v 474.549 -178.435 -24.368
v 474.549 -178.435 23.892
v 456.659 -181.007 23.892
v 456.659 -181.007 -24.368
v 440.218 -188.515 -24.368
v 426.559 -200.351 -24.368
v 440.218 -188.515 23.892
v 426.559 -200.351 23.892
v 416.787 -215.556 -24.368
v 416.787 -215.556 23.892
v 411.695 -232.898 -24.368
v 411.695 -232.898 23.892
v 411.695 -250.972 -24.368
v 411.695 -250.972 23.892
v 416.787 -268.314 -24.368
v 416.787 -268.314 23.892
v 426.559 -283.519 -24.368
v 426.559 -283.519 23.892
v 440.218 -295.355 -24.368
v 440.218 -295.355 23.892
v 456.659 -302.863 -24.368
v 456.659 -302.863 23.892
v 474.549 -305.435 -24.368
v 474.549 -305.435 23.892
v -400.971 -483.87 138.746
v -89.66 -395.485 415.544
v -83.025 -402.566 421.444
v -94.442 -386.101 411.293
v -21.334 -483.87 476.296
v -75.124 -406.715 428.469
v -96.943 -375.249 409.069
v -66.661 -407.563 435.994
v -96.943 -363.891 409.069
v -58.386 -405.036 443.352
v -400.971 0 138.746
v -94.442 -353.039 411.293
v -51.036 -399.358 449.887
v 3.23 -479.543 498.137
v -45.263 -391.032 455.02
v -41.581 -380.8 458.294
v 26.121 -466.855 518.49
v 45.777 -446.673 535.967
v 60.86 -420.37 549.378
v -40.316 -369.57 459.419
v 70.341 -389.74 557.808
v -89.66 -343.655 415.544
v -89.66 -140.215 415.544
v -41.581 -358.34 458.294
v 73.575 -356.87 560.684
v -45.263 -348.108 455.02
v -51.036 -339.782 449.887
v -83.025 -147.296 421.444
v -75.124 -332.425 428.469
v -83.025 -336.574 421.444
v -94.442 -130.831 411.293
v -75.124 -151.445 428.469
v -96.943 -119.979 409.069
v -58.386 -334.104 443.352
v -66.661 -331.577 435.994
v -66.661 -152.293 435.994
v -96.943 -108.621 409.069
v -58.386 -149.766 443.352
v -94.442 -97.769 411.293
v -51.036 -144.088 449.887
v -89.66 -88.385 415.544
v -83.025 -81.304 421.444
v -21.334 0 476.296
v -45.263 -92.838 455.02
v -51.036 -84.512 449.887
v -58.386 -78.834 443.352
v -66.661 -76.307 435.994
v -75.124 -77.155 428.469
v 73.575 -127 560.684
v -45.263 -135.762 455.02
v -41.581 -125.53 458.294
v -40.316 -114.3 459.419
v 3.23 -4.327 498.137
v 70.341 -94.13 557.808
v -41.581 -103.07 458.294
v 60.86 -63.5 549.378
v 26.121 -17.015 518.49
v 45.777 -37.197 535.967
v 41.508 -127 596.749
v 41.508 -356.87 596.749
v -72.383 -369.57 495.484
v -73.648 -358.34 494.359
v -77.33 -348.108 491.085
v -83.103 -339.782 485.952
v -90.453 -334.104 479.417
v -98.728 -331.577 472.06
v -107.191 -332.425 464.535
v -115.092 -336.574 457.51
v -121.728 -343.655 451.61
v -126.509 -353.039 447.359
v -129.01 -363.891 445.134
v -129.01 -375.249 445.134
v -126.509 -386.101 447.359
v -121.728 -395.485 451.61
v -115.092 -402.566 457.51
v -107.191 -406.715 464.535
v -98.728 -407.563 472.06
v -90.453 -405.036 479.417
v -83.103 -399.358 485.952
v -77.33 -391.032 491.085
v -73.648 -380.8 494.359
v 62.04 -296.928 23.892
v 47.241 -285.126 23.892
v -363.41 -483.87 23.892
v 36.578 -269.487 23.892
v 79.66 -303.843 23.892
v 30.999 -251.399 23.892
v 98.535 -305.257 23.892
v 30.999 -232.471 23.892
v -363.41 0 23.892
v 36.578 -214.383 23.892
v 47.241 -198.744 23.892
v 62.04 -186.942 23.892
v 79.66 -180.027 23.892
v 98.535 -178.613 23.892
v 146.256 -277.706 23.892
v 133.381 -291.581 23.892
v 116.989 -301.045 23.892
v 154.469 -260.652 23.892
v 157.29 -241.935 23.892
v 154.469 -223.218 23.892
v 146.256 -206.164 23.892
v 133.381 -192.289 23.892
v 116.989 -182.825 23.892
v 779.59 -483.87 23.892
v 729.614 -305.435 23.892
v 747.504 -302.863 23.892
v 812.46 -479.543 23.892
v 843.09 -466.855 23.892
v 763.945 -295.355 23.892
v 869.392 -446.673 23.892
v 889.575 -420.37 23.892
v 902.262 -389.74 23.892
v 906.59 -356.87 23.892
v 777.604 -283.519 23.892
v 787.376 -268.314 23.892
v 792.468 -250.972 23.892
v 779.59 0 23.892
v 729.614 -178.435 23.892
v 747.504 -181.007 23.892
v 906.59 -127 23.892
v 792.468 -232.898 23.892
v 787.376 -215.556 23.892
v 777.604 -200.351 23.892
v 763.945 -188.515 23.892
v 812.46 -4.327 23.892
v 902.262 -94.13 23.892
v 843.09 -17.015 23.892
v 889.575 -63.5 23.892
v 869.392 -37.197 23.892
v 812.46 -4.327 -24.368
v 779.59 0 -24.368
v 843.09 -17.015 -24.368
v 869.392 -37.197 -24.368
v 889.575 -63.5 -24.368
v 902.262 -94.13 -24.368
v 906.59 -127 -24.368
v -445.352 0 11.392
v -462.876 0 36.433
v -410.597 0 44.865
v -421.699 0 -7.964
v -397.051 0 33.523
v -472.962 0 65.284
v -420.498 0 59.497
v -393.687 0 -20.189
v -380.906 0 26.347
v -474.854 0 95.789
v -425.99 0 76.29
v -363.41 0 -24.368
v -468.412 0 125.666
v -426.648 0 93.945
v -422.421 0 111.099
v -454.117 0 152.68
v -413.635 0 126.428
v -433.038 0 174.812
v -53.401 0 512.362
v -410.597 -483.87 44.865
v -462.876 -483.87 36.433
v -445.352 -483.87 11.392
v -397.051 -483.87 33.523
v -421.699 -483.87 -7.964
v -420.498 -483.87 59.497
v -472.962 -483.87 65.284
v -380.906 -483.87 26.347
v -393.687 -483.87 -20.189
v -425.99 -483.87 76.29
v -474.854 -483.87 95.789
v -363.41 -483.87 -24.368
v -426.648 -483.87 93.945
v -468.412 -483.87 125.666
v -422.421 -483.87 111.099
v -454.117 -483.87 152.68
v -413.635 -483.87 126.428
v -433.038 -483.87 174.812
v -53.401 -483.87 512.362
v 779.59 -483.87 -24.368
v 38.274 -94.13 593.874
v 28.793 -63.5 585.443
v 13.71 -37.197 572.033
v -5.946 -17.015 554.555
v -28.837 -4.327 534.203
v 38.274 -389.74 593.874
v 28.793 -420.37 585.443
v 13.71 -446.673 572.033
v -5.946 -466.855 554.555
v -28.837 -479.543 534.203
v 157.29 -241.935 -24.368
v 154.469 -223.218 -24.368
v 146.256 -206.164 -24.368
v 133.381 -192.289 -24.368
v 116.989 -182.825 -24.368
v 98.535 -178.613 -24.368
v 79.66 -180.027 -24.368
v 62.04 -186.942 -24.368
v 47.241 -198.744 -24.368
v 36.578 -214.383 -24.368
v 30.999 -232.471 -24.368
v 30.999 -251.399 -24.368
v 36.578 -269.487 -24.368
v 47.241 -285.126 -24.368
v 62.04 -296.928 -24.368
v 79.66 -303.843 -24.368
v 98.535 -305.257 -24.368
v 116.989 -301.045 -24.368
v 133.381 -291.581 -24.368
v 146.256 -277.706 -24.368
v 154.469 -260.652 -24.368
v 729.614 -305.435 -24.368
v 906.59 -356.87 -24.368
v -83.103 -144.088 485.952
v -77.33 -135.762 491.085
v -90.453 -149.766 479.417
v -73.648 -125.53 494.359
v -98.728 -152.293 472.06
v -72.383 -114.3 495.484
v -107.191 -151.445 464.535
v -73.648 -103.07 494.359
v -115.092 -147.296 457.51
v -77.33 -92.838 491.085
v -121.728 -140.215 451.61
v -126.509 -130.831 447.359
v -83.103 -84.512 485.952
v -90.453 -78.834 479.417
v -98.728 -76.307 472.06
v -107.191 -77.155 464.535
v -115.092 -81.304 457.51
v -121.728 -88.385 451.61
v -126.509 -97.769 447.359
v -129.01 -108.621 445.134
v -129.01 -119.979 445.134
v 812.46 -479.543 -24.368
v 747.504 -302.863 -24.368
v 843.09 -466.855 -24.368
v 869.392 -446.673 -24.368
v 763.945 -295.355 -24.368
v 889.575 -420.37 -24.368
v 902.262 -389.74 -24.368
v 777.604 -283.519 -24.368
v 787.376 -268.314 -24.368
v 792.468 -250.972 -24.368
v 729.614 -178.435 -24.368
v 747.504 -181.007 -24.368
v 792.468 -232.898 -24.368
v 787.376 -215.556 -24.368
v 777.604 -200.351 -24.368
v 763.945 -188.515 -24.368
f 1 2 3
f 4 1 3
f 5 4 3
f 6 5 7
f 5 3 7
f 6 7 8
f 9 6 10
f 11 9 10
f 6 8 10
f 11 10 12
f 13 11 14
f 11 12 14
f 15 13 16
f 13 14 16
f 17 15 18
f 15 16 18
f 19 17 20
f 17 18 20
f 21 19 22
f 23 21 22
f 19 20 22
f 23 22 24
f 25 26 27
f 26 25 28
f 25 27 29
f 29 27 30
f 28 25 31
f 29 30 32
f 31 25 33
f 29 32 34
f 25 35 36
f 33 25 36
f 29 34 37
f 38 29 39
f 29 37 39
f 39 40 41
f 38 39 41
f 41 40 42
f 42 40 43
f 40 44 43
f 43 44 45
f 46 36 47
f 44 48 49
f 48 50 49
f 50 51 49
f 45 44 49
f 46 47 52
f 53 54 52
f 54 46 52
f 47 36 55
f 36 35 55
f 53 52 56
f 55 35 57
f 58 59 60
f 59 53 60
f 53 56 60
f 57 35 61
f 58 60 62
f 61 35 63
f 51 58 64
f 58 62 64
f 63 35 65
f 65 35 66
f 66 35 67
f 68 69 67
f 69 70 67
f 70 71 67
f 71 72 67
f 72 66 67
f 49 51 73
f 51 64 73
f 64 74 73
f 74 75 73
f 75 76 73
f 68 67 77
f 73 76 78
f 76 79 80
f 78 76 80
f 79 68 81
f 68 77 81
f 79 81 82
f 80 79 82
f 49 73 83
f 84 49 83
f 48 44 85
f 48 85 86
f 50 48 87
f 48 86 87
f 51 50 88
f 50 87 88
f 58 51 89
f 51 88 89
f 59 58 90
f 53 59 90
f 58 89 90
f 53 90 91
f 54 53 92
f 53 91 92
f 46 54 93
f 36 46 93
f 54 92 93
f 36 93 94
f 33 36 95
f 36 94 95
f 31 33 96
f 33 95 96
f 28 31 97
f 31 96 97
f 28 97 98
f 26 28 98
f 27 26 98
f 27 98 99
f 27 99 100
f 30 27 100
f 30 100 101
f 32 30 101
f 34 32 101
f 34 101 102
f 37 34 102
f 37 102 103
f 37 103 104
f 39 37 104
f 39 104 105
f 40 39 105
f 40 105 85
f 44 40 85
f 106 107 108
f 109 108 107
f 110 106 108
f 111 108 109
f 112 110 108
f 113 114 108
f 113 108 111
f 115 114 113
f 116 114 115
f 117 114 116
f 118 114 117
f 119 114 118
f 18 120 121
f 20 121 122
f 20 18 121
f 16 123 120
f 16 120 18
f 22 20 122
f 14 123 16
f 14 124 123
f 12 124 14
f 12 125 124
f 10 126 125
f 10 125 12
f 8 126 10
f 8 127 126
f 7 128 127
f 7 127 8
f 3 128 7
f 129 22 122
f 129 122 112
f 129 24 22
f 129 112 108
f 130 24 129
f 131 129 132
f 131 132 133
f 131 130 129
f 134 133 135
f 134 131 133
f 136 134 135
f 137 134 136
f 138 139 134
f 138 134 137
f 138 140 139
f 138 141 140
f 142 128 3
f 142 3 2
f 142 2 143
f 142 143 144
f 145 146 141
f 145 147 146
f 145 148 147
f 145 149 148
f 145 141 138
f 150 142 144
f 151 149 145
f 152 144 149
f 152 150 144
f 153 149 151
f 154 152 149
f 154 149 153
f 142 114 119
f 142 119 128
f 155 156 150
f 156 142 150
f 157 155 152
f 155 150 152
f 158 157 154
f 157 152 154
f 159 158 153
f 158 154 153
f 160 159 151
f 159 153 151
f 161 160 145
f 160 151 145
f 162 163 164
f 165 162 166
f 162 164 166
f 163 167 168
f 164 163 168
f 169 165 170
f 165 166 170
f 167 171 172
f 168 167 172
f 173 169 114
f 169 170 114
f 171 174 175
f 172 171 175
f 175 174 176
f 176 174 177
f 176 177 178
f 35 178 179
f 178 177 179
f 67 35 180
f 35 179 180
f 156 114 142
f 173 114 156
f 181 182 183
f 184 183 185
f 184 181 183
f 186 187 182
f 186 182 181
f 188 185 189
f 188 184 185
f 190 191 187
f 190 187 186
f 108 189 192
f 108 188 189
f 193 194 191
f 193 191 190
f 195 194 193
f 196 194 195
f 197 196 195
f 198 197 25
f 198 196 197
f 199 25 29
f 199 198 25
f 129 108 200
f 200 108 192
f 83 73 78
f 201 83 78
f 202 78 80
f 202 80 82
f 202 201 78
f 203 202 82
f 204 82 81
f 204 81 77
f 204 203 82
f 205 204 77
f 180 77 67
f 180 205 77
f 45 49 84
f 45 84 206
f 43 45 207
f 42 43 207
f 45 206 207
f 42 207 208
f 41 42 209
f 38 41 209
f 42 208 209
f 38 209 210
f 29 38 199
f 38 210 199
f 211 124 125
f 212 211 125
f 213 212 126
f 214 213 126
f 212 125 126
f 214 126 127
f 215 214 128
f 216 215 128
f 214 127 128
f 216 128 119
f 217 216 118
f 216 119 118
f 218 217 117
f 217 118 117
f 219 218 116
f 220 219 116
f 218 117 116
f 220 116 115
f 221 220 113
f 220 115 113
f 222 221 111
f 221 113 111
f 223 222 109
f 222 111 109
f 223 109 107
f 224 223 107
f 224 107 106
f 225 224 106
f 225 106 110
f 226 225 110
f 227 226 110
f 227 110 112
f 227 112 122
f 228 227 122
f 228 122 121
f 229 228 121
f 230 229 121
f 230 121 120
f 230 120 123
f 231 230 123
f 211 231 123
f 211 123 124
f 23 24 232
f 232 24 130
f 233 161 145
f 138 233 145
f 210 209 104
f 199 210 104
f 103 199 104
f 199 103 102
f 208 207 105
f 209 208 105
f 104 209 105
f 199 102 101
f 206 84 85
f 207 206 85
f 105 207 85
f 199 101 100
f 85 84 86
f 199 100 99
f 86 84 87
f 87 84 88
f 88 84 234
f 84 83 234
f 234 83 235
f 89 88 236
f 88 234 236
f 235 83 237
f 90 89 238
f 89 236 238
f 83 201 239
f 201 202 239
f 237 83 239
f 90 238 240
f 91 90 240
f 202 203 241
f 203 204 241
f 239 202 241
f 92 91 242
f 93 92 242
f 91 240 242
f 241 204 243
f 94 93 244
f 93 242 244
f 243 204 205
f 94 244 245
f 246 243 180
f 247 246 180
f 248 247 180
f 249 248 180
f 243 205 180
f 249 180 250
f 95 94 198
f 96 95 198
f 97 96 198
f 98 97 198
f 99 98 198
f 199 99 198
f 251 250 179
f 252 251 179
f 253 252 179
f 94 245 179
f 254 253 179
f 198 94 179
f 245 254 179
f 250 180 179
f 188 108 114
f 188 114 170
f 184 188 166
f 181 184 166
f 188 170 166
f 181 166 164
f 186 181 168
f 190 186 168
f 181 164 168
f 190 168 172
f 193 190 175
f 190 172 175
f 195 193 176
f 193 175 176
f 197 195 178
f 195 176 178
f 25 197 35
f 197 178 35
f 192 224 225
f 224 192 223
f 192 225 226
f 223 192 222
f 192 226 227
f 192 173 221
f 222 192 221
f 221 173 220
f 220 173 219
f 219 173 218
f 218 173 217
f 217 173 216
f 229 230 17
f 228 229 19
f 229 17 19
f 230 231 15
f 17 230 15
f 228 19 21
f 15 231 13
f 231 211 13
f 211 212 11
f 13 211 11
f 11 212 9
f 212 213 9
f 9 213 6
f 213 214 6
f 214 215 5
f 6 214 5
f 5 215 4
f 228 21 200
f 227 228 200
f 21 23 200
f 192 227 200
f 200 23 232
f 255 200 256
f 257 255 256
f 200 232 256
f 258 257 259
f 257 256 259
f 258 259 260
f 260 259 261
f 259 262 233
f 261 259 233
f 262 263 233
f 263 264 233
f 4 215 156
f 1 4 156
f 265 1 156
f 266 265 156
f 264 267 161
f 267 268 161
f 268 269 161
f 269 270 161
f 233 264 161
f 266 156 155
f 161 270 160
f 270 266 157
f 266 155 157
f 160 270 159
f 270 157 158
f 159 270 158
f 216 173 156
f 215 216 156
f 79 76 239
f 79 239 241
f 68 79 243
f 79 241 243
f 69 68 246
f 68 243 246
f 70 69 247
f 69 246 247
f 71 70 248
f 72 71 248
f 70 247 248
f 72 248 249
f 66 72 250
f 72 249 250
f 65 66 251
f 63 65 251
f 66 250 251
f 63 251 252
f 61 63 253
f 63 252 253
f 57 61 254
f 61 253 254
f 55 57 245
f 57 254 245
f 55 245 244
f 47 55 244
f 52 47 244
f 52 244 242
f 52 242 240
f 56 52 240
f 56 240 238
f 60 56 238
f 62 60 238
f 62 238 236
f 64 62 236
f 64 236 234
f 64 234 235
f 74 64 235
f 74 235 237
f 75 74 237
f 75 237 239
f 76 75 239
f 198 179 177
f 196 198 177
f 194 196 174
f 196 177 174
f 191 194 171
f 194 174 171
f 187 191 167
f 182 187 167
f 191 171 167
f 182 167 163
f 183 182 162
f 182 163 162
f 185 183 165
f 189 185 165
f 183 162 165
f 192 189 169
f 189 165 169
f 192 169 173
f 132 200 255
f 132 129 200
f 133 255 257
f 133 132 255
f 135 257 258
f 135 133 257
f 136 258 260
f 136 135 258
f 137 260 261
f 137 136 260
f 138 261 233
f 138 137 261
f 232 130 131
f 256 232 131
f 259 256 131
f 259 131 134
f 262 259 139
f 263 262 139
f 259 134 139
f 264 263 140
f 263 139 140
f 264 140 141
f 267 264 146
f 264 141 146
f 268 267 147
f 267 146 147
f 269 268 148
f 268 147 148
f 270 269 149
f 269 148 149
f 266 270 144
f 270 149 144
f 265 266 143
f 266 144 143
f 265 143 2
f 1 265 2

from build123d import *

# Parameters (mm, degrees)
F0_W          = 1270
F0_H          = 48.26
F1_DEPTH      = 483.87
F2_R          = 127
F3_R          = 127
F4_R          = 38.1
F5_DEPTH      = 119.38
F6_R          = 63.5
F7_DEPTH      = 76.2
F7_DEPTH_BACK = 76.2


with BuildPart() as f1:
    # F0 (on Front) → F1 (new body)
    with BuildSketch(Plane.XZ):
        with Locations((271.5897267231, -0.2383861614)):
            Rectangle(F0_W, F0_H)
        with BuildLine():
            Line((-363.4102732769, -24.3683861614), (-363.4102732769, 23.8916138386))
            ThreePointArc((-363.4102732769, 23.8916138386), (-423.8304438336, 67.7016554332), (-400.9706434856, 138.7463335075))
            Line((-400.9706434856, 138.7463335075), (-433.0378788647, 174.8118296935))
            ThreePointArc((-433.0378788647, 174.8118296935), (-468.9099911057, 50.5119834442), (-363.4102732769, -24.3683861614))
        make_face()
        Polygon((-433.0378788647, 174.8118296935), (-400.9706434856, 138.7463335075), (73.5753589619, 560.6836411268), (41.5081235828, 596.7491373128), align=None)
    extrude(amount=F1_DEPTH)

    # F2
    f2_edges = [f1.edges().sort_by_distance(p)[0] for p in [
        (57.541741, 0, 578.716389),
        (57.541741, -483.87, 578.716389),
    ]]
    fillet(f2_edges, radius=F2_R)

    # F3
    f3_edges = [f1.edges().sort_by_distance(p)[0] for p in [
        (906.589727, -483.87, -0.238386),
        (906.589727, 0, -0.238386),
    ]]
    fillet(f3_edges, radius=F3_R)

    # F4 (on face) → F5 (cut)
    with BuildSketch(Plane(origin=(-277.999987923, 0, 312.6620485248), x_dir=(0.7473165393, 0, 0.664468201), z_dir=(-0.664468201, 0, 0.7473165393))):
        with Locations((237.0405329721, -114.3)):
            Circle(F4_R)
        with Locations((237.0405329721, -369.57)):
            Circle(F4_R)
    extrude(amount=-F5_DEPTH, mode=Mode.SUBTRACT)

    # F6 (on face) → F7 (cut, two sides)
    with BuildSketch(Plane.XY.offset(23.8916138386)) as f7_sk:
        with Locations((93.7897267231, -241.935)):
            Circle(F6_R)
        with BuildLine():
            ThreePointArc((538.0487868786, -241.935), (519.4500674839, -197.0337193947), (474.5487868786, -178.435))
            ThreePointArc((474.5487868786, -178.435), (411.0487868786, -241.935), (474.5487868786, -305.435))
            ThreePointArc((474.5487868786, -305.435), (519.4500674839, -286.8362806053), (538.0487868786, -241.935))
        make_face()
        with BuildLine():
            ThreePointArc((729.6141386032, -305.435), (666.1141386032, -241.935), (729.6141386032, -178.435))
            Line((729.6141386032, -178.435), (474.5487868786, -178.435))
            ThreePointArc((474.5487868786, -178.435), (519.4500674839, -197.0337193947), (538.0487868786, -241.935))
            ThreePointArc((538.0487868786, -241.935), (519.4500674839, -286.8362806053), (474.5487868786, -305.435))
            Line((474.5487868786, -305.435), (729.6141386032, -305.435))
        make_face()
        with BuildLine():
            ThreePointArc((729.6141386032, -305.435), (774.5154192086, -286.8362806053), (793.1141386032, -241.935))
            ThreePointArc((793.1141386032, -241.935), (774.5154192086, -197.0337193947), (729.6141386032, -178.435))
            ThreePointArc((729.6141386032, -178.435), (666.1141386032, -241.935), (729.6141386032, -305.435))
        make_face()
    extrude(amount=-F7_DEPTH, mode=Mode.SUBTRACT)
    extrude(f7_sk.sketch, amount=F7_DEPTH_BACK, mode=Mode.SUBTRACT)


solid = f1.part
